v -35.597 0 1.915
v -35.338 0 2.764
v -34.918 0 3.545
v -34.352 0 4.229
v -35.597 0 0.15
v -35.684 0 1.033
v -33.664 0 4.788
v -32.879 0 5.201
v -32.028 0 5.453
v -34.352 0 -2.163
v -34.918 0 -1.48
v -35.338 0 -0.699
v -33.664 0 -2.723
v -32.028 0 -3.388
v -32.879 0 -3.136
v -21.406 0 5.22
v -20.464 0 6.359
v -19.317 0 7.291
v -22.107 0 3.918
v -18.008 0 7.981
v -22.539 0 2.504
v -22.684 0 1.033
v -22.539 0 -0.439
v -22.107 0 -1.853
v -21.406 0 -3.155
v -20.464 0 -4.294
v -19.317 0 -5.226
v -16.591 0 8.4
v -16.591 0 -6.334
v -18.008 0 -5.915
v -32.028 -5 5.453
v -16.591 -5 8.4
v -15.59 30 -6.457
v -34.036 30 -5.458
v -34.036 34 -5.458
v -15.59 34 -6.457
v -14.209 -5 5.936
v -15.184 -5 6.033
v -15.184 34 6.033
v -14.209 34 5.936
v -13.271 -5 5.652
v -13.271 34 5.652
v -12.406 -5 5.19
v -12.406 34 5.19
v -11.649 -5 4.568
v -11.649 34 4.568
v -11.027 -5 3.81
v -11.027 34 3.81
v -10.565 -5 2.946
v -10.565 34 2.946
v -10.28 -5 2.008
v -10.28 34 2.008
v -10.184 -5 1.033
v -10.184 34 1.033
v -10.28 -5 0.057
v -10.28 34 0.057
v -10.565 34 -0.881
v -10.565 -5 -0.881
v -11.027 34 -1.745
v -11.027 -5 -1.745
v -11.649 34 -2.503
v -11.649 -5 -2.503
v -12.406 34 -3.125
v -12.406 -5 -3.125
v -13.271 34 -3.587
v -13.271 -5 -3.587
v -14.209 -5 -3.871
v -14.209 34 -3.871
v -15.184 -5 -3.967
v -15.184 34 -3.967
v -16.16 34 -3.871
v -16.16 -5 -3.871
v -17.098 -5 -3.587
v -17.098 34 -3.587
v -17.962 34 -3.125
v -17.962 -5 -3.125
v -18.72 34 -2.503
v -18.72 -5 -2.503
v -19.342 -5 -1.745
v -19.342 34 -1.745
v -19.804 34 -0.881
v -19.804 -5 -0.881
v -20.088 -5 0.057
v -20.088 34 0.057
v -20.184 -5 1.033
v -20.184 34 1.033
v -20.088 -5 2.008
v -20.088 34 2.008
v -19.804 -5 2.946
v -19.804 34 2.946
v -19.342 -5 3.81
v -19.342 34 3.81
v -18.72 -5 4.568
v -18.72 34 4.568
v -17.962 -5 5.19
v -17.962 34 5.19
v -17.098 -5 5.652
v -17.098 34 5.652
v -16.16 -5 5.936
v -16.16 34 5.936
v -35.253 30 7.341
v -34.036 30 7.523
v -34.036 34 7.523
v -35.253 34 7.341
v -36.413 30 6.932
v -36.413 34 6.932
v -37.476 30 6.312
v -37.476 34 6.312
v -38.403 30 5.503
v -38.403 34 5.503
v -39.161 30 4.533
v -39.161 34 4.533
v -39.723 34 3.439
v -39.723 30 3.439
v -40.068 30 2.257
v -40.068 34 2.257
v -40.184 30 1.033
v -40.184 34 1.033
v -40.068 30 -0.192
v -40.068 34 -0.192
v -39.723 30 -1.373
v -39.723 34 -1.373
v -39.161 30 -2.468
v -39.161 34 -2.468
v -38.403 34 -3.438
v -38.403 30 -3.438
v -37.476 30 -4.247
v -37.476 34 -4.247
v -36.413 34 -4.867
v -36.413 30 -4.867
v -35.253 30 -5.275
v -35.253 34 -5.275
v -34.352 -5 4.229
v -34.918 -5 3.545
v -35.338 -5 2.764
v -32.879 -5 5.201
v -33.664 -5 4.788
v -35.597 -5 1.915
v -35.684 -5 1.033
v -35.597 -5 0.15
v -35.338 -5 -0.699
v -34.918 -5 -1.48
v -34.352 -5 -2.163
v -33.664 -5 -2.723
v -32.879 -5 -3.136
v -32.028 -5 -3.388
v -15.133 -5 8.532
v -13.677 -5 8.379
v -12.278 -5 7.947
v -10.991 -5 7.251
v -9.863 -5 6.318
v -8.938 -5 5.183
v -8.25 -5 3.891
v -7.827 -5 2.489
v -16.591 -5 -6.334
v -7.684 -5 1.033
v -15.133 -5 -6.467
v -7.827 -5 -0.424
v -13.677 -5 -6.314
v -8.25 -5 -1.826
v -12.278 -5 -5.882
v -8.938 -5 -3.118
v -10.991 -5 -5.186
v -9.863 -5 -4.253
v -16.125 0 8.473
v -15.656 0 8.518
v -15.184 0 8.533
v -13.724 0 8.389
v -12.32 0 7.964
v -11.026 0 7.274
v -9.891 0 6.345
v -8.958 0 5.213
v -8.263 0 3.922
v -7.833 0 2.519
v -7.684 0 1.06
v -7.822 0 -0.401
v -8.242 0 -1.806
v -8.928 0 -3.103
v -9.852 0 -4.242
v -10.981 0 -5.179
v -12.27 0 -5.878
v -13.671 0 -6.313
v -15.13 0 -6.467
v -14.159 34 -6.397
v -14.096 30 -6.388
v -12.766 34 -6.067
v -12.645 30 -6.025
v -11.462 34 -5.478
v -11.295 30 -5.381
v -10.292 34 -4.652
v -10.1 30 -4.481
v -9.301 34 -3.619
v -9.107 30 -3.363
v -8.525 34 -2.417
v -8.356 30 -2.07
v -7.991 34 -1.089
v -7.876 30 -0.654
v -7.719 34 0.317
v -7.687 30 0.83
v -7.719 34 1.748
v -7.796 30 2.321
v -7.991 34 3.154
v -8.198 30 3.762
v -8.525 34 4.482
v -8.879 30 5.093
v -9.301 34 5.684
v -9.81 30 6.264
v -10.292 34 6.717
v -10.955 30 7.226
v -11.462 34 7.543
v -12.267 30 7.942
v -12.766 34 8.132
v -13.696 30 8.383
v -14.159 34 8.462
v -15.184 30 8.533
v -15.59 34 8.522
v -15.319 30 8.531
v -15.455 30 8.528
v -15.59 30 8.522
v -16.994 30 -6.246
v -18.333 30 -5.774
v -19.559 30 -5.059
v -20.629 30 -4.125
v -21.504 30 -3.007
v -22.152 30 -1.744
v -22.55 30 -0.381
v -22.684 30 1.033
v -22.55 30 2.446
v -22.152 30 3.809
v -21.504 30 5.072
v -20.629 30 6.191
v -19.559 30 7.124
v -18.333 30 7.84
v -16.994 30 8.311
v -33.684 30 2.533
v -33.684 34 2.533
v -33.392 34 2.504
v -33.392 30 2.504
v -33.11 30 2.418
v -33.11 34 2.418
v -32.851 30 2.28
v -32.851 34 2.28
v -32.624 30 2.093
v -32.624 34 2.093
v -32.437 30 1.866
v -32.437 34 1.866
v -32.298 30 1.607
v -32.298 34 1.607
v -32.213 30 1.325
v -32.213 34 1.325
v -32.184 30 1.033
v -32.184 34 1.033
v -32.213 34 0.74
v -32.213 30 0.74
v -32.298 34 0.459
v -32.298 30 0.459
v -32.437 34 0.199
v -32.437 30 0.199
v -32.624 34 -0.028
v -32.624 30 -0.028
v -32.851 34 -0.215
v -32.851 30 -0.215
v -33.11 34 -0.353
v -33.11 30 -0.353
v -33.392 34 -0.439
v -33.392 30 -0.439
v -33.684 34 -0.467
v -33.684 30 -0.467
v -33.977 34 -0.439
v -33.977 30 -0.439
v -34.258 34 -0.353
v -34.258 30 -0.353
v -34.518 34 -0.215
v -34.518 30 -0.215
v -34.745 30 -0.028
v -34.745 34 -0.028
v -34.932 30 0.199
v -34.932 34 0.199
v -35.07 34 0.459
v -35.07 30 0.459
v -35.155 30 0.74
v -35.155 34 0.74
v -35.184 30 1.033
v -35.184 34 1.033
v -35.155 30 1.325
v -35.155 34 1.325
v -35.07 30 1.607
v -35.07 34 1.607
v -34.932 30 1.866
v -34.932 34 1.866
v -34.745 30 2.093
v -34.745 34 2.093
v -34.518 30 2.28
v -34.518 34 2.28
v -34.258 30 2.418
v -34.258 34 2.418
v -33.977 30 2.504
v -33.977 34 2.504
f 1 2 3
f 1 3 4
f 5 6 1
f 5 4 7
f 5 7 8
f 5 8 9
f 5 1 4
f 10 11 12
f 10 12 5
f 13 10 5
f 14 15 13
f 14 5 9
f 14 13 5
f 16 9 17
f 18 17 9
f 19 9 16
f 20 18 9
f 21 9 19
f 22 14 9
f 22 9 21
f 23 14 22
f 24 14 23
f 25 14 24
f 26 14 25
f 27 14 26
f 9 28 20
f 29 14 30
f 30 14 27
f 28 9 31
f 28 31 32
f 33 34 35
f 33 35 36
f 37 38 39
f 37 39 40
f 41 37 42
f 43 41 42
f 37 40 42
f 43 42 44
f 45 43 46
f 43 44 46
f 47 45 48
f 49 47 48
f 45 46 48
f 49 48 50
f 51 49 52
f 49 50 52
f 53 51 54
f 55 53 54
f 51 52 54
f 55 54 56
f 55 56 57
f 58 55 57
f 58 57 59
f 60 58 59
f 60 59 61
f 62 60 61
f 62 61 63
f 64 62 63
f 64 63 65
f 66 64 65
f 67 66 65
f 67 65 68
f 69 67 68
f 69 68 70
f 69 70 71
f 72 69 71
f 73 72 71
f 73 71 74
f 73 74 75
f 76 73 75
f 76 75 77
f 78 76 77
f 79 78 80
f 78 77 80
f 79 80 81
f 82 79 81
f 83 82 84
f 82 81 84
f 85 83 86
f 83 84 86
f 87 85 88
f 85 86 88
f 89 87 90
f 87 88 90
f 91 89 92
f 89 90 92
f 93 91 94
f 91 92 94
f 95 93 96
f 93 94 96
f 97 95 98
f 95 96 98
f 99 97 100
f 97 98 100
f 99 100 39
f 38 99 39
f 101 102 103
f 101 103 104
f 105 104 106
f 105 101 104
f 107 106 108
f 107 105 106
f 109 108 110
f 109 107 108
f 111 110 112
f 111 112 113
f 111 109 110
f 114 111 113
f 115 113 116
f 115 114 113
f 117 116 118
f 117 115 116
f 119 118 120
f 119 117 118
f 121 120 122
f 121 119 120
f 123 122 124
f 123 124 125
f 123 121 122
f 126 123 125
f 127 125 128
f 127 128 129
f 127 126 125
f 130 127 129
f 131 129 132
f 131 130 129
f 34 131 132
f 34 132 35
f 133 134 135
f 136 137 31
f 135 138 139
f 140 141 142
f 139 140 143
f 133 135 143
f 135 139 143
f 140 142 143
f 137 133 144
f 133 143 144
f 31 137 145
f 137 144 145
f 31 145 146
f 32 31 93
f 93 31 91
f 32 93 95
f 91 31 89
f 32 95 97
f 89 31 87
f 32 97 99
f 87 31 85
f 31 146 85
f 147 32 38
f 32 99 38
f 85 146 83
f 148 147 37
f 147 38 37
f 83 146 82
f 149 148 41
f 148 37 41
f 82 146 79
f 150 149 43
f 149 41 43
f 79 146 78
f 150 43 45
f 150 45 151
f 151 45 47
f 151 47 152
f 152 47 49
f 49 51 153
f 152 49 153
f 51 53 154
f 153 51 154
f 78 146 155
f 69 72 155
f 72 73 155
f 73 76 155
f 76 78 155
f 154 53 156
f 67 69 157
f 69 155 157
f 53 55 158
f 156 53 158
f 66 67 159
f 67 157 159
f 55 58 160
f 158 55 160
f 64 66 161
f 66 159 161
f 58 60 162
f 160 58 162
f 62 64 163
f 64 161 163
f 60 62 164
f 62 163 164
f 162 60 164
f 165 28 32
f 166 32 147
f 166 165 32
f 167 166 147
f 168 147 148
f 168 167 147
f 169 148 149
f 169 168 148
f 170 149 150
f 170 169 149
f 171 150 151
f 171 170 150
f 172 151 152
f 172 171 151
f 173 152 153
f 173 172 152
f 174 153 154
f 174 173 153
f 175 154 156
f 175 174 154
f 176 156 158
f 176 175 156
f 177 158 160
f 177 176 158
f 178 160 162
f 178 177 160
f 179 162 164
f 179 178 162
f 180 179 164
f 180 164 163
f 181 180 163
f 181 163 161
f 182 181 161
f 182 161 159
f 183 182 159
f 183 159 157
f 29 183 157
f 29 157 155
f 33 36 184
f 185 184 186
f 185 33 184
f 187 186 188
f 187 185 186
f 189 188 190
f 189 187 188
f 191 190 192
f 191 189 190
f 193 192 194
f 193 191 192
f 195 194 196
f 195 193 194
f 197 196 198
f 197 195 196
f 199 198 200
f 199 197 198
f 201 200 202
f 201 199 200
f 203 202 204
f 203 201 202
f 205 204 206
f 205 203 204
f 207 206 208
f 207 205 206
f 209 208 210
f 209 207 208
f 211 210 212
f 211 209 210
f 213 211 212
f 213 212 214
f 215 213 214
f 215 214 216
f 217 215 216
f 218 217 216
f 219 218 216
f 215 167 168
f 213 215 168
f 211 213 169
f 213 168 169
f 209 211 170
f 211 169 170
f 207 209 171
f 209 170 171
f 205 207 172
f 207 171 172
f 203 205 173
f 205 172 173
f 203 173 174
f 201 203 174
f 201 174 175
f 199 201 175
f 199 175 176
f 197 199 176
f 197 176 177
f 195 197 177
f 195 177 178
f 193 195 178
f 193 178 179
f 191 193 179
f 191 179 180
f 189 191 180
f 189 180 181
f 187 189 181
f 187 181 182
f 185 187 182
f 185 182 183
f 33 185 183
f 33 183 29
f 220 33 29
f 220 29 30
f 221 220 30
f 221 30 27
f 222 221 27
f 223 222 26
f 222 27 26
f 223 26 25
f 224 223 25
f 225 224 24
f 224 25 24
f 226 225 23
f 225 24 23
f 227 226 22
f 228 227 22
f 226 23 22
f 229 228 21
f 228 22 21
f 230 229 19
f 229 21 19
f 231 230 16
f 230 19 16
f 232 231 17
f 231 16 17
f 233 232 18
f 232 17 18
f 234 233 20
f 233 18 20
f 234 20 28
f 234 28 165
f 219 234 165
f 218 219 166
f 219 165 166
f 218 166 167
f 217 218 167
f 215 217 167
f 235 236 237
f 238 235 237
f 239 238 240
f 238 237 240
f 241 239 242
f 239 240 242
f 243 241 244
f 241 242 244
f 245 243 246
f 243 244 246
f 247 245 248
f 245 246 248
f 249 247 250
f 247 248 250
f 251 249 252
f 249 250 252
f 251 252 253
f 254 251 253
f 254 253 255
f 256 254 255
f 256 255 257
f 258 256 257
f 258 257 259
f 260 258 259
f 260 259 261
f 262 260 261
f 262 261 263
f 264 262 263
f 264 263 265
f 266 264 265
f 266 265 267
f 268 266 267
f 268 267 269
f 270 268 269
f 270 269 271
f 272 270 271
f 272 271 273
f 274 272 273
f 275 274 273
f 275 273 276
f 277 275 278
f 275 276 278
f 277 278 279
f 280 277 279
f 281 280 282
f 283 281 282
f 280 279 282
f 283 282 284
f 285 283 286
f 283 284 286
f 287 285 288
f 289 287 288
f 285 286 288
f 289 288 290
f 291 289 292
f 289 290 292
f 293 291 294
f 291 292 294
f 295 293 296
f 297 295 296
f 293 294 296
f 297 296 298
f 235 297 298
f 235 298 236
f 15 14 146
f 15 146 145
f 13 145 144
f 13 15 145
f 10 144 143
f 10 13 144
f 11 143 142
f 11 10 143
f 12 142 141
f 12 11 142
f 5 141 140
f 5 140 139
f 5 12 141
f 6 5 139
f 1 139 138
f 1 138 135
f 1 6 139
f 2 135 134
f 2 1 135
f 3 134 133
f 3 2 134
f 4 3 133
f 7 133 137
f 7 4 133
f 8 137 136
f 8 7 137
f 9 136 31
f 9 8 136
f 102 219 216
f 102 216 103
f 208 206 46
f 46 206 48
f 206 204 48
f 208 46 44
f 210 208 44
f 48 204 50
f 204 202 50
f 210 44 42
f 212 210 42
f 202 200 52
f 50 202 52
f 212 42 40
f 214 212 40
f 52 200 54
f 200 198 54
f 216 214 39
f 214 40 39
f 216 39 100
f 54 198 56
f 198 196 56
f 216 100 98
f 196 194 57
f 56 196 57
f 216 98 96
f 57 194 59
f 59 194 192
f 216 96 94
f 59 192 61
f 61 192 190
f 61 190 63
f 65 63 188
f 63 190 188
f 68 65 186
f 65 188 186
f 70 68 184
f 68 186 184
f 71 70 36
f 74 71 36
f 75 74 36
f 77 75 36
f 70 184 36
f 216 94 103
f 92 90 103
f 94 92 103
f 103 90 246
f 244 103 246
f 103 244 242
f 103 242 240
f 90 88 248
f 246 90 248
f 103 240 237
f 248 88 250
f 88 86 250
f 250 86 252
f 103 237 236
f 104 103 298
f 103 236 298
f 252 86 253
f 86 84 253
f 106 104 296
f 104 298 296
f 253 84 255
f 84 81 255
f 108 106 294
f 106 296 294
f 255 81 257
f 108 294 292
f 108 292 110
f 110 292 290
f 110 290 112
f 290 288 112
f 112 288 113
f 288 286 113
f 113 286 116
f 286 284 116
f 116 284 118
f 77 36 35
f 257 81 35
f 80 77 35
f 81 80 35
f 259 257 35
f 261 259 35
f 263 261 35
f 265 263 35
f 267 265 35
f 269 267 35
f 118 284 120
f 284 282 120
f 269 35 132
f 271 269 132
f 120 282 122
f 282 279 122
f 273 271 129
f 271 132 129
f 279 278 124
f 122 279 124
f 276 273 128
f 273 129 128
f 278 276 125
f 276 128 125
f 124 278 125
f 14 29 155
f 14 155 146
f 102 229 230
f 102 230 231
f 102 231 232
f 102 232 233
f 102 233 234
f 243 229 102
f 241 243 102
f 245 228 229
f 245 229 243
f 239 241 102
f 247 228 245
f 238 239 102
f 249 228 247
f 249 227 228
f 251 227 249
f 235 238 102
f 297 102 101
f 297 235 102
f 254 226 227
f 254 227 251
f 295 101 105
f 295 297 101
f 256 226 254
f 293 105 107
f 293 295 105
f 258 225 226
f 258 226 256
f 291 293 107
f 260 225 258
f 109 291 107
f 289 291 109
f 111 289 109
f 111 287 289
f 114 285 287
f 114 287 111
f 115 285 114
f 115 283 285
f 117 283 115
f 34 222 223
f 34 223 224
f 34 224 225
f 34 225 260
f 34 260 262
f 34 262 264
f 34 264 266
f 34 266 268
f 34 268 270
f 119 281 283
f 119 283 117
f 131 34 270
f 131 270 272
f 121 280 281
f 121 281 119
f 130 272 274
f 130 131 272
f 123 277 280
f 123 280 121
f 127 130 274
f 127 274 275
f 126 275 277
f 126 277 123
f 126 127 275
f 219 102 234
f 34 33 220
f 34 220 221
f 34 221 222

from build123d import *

# Parameters (mm, degrees)
CROQUIS1_R              = 7.5
SALIENTE_EXTRUIR1_DEPTH = 30
SALIENTE_EXTRUIR2_DEPTH = 4
SALIENTE_EXTRUIR3_DEPTH = 5
CROQUIS4_R              = 1.5
CORTAR_EXTRUIR1_DEPTH   = 5
CROQUIS5_R              = 5
CORTAR_EXTRUIR2_DEPTH   = 57.644348631


with BuildPart() as part:
    # Croquis1 → Saliente-Extruir1 (new body)
    with BuildSketch(Plane(origin=(0, 0, 0), x_dir=(1, 0, 0), z_dir=(0, 1, 0))):
        with Locations(Location((-15.184301915, -1.03253253, 0), (0, 0, 270))):
            Circle(CROQUIS1_R)
    extrude(amount=SALIENTE_EXTRUIR1_DEPTH)

    # Croquis2 → Saliente-Extruir2 (add)
    with BuildSketch(Plane(origin=(0, 30, 0), x_dir=(1, 0, 0), z_dir=(0, 1, 0))):
        with BuildLine():
            Line((-15.589707321, -8.521567612), (-34.035653267, -7.523029601))
            ThreePointArc((-34.035653267, -7.523029601), (-40.184301915, -1.03253253), (-34.035653267, 5.457964541))
            Line((-34.035653267, 5.457964541), (-15.589707321, 6.456502552))
            ThreePointArc((-15.589707321, 6.456502552), (-7.684301915, -1.03253253), (-15.589707321, -8.521567612))
        make_face()
    extrude(amount=SALIENTE_EXTRUIR2_DEPTH)

    # Croquis3 → Saliente-Extruir3 (add)
    with BuildSketch(Plane(origin=(0, 0, 0), x_dir=(-1, 0, 0), z_dir=(0, -1, 0))):
        with BuildLine():
            Line((32.028051915, -5.452723243), (16.590551915, -8.399517052))
            ThreePointArc((16.590551915, -8.399517052), (7.684301915, -1.03253253), (16.590551915, 6.334451991))
            Line((16.590551915, 6.334451991), (32.028051915, 3.387658183))
            ThreePointArc((32.028051915, 3.387658183), (35.684301915, -1.03253253), (32.028051915, -5.452723243))
        make_face()
    extrude(amount=SALIENTE_EXTRUIR3_DEPTH)

    # Croquis4 → Cortar-Extruir1 (cut)
    with BuildSketch(Plane(origin=(0, 34, 0), x_dir=(1, 0, 0), z_dir=(0, 1, 0))):
        with Locations(Location((-33.684301915, -1.03253253, 0), (0, 0, 270))):
            Circle(CROQUIS4_R)
    extrude(amount=-CORTAR_EXTRUIR1_DEPTH, mode=Mode.SUBTRACT)

    # Croquis5 → Cortar-Extruir2 (cut, through all)
    with BuildSketch(Plane(origin=(0, 34, 0), x_dir=(1, 0, 0), z_dir=(0, 1, 0))):
        with Locations(Location((-15.184301915, -1.03253253, 0), (0, 0, 270))):
            Circle(CROQUIS5_R)
    extrude(amount=-CORTAR_EXTRUIR2_DEPTH, mode=Mode.SUBTRACT)


solid = part.part
